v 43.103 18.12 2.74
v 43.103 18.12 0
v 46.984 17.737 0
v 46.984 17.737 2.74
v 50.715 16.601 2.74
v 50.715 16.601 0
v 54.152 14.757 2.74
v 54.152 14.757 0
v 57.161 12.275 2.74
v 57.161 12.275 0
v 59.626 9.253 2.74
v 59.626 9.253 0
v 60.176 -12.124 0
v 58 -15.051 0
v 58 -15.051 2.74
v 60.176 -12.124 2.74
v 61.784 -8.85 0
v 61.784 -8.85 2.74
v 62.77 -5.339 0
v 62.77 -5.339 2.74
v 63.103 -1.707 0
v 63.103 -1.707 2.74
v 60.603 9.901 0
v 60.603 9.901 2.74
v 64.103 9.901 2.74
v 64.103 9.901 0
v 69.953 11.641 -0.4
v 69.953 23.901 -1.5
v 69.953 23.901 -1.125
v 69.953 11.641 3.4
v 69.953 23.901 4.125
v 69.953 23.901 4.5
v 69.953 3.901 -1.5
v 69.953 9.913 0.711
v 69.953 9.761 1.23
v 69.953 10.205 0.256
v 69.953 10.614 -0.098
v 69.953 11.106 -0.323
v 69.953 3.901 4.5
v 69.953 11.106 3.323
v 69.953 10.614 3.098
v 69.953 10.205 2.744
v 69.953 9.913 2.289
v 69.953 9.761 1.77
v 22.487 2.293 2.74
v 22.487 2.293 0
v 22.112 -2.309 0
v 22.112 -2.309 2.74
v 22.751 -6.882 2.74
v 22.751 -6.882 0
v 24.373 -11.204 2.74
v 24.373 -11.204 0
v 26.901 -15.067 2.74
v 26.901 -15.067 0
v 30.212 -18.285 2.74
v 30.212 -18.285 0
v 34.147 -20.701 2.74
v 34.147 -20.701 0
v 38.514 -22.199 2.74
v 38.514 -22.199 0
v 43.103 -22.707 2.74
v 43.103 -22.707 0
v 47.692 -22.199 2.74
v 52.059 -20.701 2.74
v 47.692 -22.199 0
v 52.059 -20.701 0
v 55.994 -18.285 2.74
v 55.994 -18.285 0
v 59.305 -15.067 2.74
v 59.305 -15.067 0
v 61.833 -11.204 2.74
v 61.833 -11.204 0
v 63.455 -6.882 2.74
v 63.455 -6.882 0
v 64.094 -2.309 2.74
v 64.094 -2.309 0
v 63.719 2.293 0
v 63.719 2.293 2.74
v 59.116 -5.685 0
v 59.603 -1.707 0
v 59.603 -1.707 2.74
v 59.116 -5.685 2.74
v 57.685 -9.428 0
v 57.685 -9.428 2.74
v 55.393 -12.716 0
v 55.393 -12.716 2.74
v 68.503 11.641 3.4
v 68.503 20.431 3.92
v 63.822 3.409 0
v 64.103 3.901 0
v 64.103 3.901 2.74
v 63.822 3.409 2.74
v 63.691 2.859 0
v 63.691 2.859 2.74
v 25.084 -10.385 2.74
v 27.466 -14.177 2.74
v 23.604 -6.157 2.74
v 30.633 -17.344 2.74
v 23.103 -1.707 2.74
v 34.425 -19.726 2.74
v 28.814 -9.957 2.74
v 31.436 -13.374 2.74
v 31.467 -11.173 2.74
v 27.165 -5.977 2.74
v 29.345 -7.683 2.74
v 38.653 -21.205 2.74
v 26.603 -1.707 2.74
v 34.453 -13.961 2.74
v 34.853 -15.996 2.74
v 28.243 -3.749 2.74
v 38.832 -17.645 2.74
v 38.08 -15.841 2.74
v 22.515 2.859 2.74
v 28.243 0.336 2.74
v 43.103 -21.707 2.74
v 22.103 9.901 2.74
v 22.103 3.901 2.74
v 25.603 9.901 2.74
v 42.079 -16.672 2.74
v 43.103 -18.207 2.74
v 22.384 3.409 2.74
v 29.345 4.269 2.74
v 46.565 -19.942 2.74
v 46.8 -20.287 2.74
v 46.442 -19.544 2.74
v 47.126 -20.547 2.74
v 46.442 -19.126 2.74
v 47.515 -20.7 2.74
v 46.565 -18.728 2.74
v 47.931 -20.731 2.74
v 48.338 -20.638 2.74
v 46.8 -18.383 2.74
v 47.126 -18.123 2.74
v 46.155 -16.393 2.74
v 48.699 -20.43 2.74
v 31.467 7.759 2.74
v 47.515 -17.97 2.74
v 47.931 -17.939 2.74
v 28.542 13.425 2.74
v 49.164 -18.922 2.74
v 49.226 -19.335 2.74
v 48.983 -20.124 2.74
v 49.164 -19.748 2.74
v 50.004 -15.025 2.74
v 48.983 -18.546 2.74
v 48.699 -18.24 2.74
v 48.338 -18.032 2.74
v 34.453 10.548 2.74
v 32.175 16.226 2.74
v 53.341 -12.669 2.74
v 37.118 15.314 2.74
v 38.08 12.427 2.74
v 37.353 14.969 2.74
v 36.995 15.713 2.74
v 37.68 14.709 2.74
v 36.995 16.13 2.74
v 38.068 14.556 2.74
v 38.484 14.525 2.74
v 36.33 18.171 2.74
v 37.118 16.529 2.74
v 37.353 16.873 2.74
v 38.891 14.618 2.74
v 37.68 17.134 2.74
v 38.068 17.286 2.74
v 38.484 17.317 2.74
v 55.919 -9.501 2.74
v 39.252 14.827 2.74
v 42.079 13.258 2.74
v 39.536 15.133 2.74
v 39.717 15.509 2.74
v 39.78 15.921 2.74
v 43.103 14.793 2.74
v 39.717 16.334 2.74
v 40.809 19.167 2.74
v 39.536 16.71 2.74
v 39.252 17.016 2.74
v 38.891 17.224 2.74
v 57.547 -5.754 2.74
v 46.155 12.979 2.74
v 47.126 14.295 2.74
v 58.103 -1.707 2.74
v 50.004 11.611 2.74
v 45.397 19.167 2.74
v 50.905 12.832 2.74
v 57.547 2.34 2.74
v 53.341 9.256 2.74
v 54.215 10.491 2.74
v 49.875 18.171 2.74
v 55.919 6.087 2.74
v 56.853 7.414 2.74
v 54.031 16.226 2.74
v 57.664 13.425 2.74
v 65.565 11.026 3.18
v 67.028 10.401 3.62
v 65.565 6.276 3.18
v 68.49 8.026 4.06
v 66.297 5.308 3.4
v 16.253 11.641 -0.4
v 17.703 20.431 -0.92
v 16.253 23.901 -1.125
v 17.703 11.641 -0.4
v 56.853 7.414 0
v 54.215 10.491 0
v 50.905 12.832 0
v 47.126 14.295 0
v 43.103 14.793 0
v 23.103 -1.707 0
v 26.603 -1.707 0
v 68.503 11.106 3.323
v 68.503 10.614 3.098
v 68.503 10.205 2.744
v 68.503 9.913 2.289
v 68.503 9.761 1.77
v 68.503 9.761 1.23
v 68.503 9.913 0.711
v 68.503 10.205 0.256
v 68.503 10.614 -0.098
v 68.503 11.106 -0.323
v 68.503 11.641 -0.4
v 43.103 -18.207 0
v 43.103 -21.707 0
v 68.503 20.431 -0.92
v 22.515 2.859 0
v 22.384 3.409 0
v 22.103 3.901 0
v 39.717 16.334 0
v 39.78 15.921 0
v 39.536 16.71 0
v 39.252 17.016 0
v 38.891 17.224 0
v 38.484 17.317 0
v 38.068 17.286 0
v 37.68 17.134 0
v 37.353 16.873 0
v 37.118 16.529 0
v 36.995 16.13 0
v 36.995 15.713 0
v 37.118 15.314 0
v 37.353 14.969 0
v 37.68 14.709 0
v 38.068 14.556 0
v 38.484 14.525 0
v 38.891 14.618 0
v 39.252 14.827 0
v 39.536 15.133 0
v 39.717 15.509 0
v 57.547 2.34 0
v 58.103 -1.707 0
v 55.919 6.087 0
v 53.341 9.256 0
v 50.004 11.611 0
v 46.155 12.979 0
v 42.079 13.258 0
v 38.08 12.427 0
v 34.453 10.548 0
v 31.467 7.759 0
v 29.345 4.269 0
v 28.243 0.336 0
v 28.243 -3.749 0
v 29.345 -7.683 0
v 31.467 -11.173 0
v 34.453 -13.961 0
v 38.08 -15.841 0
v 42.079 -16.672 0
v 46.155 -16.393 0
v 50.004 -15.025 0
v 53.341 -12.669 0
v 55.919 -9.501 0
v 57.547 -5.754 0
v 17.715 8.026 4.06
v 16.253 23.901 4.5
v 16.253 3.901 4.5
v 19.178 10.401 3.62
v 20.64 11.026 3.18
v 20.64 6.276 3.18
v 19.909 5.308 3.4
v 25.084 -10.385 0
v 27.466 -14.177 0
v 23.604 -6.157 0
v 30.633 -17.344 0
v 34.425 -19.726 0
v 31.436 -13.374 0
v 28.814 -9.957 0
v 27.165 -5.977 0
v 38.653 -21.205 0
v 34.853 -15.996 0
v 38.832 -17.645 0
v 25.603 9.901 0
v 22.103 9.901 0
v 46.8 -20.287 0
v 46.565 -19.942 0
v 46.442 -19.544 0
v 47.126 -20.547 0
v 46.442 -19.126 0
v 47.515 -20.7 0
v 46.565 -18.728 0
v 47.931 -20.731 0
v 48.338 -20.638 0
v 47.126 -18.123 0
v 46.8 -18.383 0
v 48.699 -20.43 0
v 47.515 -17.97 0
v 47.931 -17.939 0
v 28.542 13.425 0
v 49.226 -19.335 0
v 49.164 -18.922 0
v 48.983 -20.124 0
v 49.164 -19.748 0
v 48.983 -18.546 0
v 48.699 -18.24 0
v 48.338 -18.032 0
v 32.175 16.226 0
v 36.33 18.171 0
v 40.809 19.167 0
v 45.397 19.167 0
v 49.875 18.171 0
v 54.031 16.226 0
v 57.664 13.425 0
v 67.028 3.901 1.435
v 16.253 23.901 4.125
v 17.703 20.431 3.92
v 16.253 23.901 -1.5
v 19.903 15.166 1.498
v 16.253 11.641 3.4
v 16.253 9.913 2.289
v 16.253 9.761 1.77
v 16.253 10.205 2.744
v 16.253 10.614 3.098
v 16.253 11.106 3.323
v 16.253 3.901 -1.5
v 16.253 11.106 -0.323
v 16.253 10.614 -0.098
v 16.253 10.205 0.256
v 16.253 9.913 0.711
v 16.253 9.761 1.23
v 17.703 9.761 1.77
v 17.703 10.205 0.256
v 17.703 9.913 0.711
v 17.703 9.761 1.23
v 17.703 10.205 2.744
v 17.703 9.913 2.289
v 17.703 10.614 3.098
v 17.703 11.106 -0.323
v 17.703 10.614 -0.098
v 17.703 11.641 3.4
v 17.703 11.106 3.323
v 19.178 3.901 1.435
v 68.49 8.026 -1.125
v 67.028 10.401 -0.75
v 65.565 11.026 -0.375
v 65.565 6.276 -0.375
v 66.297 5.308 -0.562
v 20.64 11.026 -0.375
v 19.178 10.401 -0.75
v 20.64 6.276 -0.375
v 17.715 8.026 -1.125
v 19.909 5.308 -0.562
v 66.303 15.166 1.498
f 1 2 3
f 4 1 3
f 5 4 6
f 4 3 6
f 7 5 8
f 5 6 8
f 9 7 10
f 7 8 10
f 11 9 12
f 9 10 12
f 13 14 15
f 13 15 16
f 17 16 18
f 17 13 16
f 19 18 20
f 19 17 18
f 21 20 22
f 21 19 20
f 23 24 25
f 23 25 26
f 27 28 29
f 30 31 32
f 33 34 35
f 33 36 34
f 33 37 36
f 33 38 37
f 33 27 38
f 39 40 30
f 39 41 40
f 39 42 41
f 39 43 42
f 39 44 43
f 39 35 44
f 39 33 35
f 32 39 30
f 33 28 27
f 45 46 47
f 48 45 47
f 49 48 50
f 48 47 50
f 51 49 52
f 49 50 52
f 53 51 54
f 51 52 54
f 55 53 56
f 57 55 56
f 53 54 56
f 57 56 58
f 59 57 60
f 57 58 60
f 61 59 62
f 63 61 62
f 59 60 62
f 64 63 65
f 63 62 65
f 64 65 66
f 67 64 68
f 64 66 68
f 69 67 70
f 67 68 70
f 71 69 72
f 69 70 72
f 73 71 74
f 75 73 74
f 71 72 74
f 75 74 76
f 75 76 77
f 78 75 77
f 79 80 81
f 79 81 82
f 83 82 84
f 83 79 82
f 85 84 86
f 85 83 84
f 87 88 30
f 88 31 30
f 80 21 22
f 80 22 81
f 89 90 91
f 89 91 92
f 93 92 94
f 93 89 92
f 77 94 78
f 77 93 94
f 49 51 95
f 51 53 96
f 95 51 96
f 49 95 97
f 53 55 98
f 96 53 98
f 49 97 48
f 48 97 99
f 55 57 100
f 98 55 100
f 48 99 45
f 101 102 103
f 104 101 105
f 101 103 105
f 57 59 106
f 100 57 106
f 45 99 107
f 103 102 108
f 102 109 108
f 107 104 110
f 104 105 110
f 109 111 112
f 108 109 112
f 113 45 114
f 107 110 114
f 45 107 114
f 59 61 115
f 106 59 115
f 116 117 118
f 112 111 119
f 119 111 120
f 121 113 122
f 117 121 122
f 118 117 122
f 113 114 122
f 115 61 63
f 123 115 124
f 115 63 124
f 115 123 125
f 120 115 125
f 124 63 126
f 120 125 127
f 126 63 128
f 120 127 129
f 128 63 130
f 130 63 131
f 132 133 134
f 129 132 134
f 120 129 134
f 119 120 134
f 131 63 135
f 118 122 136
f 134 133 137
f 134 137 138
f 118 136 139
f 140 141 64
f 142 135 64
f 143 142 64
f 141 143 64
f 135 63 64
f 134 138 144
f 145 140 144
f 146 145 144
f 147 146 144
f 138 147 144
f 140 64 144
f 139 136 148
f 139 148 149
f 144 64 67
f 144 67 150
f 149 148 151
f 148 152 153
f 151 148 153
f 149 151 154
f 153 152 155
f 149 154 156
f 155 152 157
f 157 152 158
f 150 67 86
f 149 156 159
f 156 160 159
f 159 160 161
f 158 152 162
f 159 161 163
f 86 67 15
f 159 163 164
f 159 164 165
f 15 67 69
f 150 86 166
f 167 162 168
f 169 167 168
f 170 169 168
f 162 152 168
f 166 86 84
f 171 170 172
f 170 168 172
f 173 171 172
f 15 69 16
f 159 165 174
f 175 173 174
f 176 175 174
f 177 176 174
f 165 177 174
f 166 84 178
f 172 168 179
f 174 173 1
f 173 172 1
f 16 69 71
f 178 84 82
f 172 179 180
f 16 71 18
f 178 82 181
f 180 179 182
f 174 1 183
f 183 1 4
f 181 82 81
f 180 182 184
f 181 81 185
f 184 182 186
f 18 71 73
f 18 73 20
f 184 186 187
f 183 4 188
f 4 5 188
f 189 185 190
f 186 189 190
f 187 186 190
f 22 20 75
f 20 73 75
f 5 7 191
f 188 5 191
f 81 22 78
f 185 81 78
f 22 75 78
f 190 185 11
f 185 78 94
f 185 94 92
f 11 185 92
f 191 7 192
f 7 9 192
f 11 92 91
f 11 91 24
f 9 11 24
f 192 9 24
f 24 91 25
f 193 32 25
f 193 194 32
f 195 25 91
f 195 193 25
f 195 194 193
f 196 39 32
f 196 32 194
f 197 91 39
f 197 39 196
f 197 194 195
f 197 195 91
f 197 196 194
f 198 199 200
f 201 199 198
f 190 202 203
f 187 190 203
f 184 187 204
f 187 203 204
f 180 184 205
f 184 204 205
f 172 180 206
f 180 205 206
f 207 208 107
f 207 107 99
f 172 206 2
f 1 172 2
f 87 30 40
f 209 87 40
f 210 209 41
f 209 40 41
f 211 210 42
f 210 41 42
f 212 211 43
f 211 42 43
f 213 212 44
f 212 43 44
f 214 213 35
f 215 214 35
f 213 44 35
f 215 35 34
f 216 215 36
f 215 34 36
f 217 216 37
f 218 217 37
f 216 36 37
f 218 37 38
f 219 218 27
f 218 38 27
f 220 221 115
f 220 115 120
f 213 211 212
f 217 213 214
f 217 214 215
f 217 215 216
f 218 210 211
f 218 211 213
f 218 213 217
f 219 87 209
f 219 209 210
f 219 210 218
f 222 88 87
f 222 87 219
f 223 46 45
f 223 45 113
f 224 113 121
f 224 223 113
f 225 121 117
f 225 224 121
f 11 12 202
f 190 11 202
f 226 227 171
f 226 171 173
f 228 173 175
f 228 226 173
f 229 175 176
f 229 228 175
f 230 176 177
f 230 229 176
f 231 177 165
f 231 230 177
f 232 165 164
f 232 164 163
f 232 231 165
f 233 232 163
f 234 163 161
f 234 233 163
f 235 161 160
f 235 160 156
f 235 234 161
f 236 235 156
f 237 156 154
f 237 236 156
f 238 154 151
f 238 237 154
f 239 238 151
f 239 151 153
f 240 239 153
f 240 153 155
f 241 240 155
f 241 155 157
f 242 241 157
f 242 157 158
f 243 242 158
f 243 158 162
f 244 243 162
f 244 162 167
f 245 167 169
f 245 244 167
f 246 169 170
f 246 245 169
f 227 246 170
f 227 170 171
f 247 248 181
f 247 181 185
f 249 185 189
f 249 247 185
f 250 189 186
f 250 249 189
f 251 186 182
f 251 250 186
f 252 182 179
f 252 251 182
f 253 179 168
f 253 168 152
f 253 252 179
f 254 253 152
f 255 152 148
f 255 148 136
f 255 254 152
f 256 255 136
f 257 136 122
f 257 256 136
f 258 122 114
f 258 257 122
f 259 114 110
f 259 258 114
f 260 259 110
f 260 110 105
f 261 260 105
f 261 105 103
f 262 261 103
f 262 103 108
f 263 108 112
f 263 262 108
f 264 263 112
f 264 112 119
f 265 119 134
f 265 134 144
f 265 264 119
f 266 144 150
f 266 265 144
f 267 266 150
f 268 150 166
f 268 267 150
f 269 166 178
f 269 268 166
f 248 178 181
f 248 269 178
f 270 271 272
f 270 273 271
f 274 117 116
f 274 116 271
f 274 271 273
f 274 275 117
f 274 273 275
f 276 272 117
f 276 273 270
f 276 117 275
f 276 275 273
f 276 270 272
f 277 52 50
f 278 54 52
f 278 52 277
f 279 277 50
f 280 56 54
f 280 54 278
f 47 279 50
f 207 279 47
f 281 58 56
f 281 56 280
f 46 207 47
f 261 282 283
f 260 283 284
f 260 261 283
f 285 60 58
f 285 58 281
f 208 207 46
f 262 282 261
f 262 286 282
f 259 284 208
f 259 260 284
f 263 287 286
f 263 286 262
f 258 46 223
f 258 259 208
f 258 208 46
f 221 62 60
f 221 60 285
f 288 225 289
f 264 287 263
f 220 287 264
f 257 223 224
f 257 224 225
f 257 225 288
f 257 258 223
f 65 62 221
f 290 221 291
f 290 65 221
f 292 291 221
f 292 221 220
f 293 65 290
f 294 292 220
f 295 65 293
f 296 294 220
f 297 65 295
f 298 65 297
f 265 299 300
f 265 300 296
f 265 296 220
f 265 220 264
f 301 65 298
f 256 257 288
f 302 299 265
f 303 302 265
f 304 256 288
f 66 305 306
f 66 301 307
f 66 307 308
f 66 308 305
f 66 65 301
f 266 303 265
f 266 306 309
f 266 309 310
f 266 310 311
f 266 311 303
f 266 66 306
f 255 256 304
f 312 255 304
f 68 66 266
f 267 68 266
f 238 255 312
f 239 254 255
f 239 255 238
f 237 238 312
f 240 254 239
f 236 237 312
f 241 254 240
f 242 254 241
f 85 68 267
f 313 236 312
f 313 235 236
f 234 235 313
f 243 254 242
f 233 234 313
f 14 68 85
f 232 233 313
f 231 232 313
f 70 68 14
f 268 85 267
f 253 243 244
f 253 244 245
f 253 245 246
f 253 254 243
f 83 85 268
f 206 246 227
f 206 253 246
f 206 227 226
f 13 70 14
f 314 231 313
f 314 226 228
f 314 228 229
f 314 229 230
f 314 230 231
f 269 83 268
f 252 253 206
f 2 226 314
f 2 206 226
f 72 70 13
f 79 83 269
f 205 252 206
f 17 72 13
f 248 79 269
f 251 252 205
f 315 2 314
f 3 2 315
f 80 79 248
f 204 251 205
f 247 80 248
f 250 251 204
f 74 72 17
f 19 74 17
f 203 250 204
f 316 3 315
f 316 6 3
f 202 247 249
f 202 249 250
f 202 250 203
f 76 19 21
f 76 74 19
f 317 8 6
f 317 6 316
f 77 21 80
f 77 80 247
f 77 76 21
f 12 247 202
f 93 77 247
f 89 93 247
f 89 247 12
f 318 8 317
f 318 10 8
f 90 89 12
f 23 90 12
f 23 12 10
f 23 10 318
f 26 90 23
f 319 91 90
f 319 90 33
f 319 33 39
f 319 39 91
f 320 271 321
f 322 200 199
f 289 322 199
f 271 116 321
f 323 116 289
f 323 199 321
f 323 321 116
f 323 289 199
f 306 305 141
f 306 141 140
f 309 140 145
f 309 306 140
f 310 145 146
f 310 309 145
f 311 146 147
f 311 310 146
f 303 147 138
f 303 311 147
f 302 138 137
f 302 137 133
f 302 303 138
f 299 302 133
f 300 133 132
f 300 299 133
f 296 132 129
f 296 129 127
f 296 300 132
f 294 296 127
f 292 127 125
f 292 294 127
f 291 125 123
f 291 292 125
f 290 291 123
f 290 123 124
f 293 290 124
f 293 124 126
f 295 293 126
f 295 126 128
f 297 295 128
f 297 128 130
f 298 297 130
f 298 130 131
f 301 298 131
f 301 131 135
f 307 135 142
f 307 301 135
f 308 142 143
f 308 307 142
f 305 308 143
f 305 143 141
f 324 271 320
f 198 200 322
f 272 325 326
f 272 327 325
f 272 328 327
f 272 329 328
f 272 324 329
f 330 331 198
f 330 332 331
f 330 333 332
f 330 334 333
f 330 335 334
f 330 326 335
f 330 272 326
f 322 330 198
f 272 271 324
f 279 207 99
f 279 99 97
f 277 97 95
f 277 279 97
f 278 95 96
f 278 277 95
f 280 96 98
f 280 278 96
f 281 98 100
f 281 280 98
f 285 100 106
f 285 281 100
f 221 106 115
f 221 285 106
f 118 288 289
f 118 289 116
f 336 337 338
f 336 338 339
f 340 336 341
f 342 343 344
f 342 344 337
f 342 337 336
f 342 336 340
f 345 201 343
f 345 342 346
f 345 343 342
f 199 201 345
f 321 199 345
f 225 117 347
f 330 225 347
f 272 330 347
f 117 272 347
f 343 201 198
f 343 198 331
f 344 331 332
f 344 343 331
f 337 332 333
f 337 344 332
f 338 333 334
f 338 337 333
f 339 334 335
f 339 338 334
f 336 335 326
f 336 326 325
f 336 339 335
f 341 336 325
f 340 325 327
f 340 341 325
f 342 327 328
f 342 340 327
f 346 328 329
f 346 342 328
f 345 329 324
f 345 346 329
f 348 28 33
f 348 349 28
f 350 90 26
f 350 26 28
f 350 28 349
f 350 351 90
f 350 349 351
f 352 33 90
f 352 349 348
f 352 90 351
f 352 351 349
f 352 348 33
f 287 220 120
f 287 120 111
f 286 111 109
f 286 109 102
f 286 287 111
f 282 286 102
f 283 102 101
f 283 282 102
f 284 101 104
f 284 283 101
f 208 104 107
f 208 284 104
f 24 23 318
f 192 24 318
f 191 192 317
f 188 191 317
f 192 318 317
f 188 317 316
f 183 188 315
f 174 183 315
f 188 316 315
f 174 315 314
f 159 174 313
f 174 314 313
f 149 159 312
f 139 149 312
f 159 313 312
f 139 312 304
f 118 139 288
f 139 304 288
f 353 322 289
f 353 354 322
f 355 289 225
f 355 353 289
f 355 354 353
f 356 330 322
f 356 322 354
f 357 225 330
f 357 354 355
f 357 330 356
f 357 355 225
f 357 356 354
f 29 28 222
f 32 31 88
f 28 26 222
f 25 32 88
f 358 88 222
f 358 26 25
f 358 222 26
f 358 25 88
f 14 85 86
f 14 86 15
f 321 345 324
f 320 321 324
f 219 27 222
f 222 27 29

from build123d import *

# Parameters (mm, degrees)
SKETCH_1_R          = 15
SKETCH_1_R_2        = 1.4
EXTRUDE_1_DEPTH     = 2.74
SKETCH_3_W          = 2.74
SKETCH_3_H          = 6
EXTRUDE_3_DEPTH     = 3.5
SKETCH_11_W         = 2.74
SKETCH_11_H         = 6
EXTRUDE_8_DEPTH     = 3.5
FILLET_17_R         = 2
FILLET_19_R         = 2
CUT_EXTRUDE_1_DEPTH = 1.45
CUT_EXTRUDE_START   = -1.45
CUT_EXTRUDE_2_DEPTH = 1.45


with BuildPart() as part:
    # 草图1 → 凸台-拉伸1 (new body)
    with BuildSketch(Plane.XY):
        with BuildLine():
            Line((25.602982383, 9.901284161), (25.602982383, 3.901284161))
            Line((25.602982383, 3.901284161), (22.865684115, 3.901284161))
            ThreePointArc((22.865684115, 3.901284161), (43.102982383, -22.706902605), (63.340280651, 3.901284161))
            Line((63.340280651, 3.901284161), (60.602982383, 3.901284161))
            Line((60.602982383, 3.901284161), (60.602982383, 9.901284161))
            ThreePointArc((60.602982383, 9.901284161), (43.102982383, 19.293097395), (25.602982383, 9.901284161))
        make_face()
        with Locations((43.102982383, -1.706902605)):
            Circle(SKETCH_1_R, mode=Mode.SUBTRACT)
        with Locations((38.37953481, 15.921243725)):
            Circle(SKETCH_1_R_2, mode=Mode.SUBTRACT)
        with Locations((47.826429956, -19.335048935)):
            Circle(SKETCH_1_R_2, mode=Mode.SUBTRACT)
        with BuildLine():
            Line((26.602982383, -1.706902605), (23.102982383, -1.706902605))
            ThreePointArc((23.102982383, -1.706902605), (28.96084676, -15.849038229), (43.102982383, -21.706902605))
            Line((43.102982383, -21.706902605), (43.102982383, -18.206902605))
            ThreePointArc((43.102982383, -18.206902605), (31.435720494, -13.374164495), (26.602982383, -1.706902605))
        make_face(mode=Mode.SUBTRACT)
        with BuildLine():
            Line((43.102982383, 14.793097395), (43.102982383, 18.12026115))
            ThreePointArc((43.102982383, 18.12026115), (52.478832846, 15.763353566), (59.625618846, 9.252974534))
            Line((59.625618846, 9.252974534), (56.852982383, 7.413815568))
            ThreePointArc((56.852982383, 7.413815568), (50.905486793, 12.831698598), (43.102982383, 14.793097395))
        make_face(mode=Mode.SUBTRACT)
        with BuildLine():
            Line((55.393395475, -12.715796557), (58.000452797, -15.051016486))
            ThreePointArc((58.000452797, -15.051016486), (61.783847035, -8.850101879), (63.102982383, -1.706902605))
            Line((63.102982383, -1.706902605), (59.602982383, -1.706902605))
            ThreePointArc((59.602982383, -1.706902605), (58.514695721, -7.600042006), (55.393395475, -12.715796557))
        make_face(mode=Mode.SUBTRACT)
    extrude(amount=EXTRUDE_1_DEPTH)

    # 草图3 → 凸台-拉伸3 (add)
    with BuildSketch(Plane.ZY.offset(-25.602982383)):
        with Locations((1.37, 6.901284161)):
            Rectangle(SKETCH_3_W, SKETCH_3_H)
    extrude(amount=EXTRUDE_3_DEPTH)

    # 草图11 → 凸台-拉伸8 (add)
    with BuildSketch(Plane(origin=(60.602982383, 0, 0), x_dir=(0, 0, -1), z_dir=(1, 0, 0))):
        with Locations((-1.37, 6.901284161)):
            Rectangle(SKETCH_11_W, SKETCH_11_H)
    extrude(amount=EXTRUDE_8_DEPTH)

    # 圆角17
    # the kernel refuses this fillet: 2 mm, written as the material it adds along each edge
    with BuildSketch(Plane(origin=(63.340280651, 3.901284161, 0), x_dir=(0.228936975336042, -0.9734412469810308, 0), z_dir=(0, 0, 1))) as fillet_17_piece_1:
        with BuildLine():
            CenterArc((1.731032211, 1.998451636), FILLET_17_R, 218.902952144, 48.842355981)
            Line((0.174610628, 0.742445325), (0.143482196, 0.717325199))
            ThreePointArc((0.143482196, 0.717325199), (0.048367664, 0.380380141), (-0.03893765, 0.009157479))
            Line((-0.03893765, 0.009157479), (0.001573666, -0.039969033))
            ThreePointArc((0.001573666, -0.039969033), (0.826174465, -0.023742177), (1.650775263, -0.039969033))
            Line((1.650775263, -0.039969033), (1.652348929, 0))
        make_face()
    extrude(amount=2.74)

    # 圆角19
    # the kernel refuses this fillet: 2 mm, written as the material it adds along each edge
    with BuildSketch(Plane(origin=(22.865684115, 3.901284161, 0), x_dir=(-0.22893697533604487, -0.9734412469810302, 0), z_dir=(0, 0, 1))) as fillet_19_piece_1:
        with BuildLine():
            CenterArc((1.731032211, -1.998451636), FILLET_19_R, 92.254691875, 48.842355981)
            Line((0.174610628, -0.742445325), (0.143482196, -0.717325199))
            ThreePointArc((0.143482196, -0.717325199), (0.048367664, -0.380380141), (-0.03893765, -0.009157479))
            Line((-0.03893765, -0.009157479), (0.001573666, 0.039969033))
            ThreePointArc((0.001573666, 0.039969033), (0.826174465, 0.023742177), (1.650775263, 0.039969033))
            Line((1.650775263, 0.039969033), (1.652348929, 0))
        make_face()
    extrude(amount=2.74)

    # 放样2: read off the stored shape, not the designer's step
    # 放样2: loft between two sections, ruled curve by curve
    loft_2_from = [
        Edge.make_line((64.102982383, 3.901284161, 2.74), (64.102982383, 3.901284161, 0)),
        Edge.make_line((64.102982383, 9.901284161, 2.74), (64.102982383, 3.901284161, 2.74)),
        Edge.make_line((64.102982383, 3.901284161, 0), (64.102982383, 9.901284161, 0)),
        Edge.make_line((64.102982383, 9.901284161, 0), (64.102982383, 9.901284161, 2.74)),
    ]
    loft_2_to = [
        Edge.make_line((69.952982383, 3.901284161, 4.5), (69.952982383, 3.901284161, -1.5)),
        Edge.make_line((69.952982383, 23.901284161, 4.5), (69.952982383, 3.901284161, 4.5)),
        Edge.make_line((69.952982383, 3.901284161, -1.5), (69.952982383, 23.901284161, -1.5)),
        Edge.make_line((69.952982383, 23.901284161, -1.5), (69.952982383, 23.901284161, 4.5)),
    ]
    loft_2 = Solid(Shell([*[Face.make_surface_from_curves(loft_2_from[k], loft_2_to[k]) for k in range(4)], Face(Wire(loft_2_from)), Face(Wire(loft_2_to))]))
    add(loft_2)

    # 草图31 → 切除-拉伸1 (cut)
    with BuildSketch(Plane(origin=(69.952982383, 0, 0), x_dir=(0, 0, -1), z_dir=(1, 0, 0))):
        with BuildLine():
            Line((-1.5, 23.901284161), (-4.125, 23.901284161))
            Line((-4.125, 23.901284161), (-3.4, 11.641284161))
            ThreePointArc((-3.4, 11.641284161), (-1.5, 9.741284161), (0.4, 11.641284161))
            Line((0.4, 11.641284161), (1.125, 23.901284161))
            Line((1.125, 23.901284161), (-1.5, 23.901284161))
        make_face()
    extrude(amount=-CUT_EXTRUDE_1_DEPTH, mode=Mode.SUBTRACT)

    # 放样3: read off the stored shape, not the designer's step
    # 放样3: loft between two sections, ruled curve by curve
    loft_3_from = [
        Edge.make_line((22.102982383, 9.901284161, 0), (22.102982383, 3.901284161, 0)),
        Edge.make_line((22.102982383, 3.901284161, 2.74), (22.102982383, 9.901284161, 2.74)),
        Edge.make_line((22.102982383, 3.901284161, 2.74), (22.102982383, 3.901284161, 0)),
        Edge.make_line((22.102982383, 9.901284161, 2.74), (22.102982383, 9.901284161, 0)),
    ]
    loft_3_to = [
        Edge.make_line((16.252982383, 23.901284161, -1.5), (16.252982383, 3.901284161, -1.5)),
        Edge.make_line((16.252982383, 3.901284161, 4.5), (16.252982383, 23.901284161, 4.5)),
        Edge.make_line((16.252982383, 3.901284161, 4.5), (16.252982383, 3.901284161, -1.5)),
        Edge.make_line((16.252982383, 23.901284161, 4.5), (16.252982383, 23.901284161, -1.5)),
    ]
    loft_3 = Solid(Shell([*[Face.make_surface_from_curves(loft_3_from[k], loft_3_to[k]) for k in range(4)], Face(Wire(loft_3_from)), Face(Wire(loft_3_to))]))
    add(loft_3)

    # 草图32 → 切除-拉伸2 (cut)
    with BuildSketch(Plane.ZY.offset(-16.252982383).offset(CUT_EXTRUDE_START)):
        with BuildLine():
            Line((1.5, 23.901284161), (-1.125, 23.901284161))
            Line((-1.125, 23.901284161), (-0.4, 11.641284161))
            ThreePointArc((-0.4, 11.641284161), (1.5, 9.741284161), (3.4, 11.641284161))
            Line((3.4, 11.641284161), (4.125, 23.901284161))
            Line((4.125, 23.901284161), (1.5, 23.901284161))
        make_face()
    extrude(amount=CUT_EXTRUDE_2_DEPTH, mode=Mode.SUBTRACT)


solid = part.part
